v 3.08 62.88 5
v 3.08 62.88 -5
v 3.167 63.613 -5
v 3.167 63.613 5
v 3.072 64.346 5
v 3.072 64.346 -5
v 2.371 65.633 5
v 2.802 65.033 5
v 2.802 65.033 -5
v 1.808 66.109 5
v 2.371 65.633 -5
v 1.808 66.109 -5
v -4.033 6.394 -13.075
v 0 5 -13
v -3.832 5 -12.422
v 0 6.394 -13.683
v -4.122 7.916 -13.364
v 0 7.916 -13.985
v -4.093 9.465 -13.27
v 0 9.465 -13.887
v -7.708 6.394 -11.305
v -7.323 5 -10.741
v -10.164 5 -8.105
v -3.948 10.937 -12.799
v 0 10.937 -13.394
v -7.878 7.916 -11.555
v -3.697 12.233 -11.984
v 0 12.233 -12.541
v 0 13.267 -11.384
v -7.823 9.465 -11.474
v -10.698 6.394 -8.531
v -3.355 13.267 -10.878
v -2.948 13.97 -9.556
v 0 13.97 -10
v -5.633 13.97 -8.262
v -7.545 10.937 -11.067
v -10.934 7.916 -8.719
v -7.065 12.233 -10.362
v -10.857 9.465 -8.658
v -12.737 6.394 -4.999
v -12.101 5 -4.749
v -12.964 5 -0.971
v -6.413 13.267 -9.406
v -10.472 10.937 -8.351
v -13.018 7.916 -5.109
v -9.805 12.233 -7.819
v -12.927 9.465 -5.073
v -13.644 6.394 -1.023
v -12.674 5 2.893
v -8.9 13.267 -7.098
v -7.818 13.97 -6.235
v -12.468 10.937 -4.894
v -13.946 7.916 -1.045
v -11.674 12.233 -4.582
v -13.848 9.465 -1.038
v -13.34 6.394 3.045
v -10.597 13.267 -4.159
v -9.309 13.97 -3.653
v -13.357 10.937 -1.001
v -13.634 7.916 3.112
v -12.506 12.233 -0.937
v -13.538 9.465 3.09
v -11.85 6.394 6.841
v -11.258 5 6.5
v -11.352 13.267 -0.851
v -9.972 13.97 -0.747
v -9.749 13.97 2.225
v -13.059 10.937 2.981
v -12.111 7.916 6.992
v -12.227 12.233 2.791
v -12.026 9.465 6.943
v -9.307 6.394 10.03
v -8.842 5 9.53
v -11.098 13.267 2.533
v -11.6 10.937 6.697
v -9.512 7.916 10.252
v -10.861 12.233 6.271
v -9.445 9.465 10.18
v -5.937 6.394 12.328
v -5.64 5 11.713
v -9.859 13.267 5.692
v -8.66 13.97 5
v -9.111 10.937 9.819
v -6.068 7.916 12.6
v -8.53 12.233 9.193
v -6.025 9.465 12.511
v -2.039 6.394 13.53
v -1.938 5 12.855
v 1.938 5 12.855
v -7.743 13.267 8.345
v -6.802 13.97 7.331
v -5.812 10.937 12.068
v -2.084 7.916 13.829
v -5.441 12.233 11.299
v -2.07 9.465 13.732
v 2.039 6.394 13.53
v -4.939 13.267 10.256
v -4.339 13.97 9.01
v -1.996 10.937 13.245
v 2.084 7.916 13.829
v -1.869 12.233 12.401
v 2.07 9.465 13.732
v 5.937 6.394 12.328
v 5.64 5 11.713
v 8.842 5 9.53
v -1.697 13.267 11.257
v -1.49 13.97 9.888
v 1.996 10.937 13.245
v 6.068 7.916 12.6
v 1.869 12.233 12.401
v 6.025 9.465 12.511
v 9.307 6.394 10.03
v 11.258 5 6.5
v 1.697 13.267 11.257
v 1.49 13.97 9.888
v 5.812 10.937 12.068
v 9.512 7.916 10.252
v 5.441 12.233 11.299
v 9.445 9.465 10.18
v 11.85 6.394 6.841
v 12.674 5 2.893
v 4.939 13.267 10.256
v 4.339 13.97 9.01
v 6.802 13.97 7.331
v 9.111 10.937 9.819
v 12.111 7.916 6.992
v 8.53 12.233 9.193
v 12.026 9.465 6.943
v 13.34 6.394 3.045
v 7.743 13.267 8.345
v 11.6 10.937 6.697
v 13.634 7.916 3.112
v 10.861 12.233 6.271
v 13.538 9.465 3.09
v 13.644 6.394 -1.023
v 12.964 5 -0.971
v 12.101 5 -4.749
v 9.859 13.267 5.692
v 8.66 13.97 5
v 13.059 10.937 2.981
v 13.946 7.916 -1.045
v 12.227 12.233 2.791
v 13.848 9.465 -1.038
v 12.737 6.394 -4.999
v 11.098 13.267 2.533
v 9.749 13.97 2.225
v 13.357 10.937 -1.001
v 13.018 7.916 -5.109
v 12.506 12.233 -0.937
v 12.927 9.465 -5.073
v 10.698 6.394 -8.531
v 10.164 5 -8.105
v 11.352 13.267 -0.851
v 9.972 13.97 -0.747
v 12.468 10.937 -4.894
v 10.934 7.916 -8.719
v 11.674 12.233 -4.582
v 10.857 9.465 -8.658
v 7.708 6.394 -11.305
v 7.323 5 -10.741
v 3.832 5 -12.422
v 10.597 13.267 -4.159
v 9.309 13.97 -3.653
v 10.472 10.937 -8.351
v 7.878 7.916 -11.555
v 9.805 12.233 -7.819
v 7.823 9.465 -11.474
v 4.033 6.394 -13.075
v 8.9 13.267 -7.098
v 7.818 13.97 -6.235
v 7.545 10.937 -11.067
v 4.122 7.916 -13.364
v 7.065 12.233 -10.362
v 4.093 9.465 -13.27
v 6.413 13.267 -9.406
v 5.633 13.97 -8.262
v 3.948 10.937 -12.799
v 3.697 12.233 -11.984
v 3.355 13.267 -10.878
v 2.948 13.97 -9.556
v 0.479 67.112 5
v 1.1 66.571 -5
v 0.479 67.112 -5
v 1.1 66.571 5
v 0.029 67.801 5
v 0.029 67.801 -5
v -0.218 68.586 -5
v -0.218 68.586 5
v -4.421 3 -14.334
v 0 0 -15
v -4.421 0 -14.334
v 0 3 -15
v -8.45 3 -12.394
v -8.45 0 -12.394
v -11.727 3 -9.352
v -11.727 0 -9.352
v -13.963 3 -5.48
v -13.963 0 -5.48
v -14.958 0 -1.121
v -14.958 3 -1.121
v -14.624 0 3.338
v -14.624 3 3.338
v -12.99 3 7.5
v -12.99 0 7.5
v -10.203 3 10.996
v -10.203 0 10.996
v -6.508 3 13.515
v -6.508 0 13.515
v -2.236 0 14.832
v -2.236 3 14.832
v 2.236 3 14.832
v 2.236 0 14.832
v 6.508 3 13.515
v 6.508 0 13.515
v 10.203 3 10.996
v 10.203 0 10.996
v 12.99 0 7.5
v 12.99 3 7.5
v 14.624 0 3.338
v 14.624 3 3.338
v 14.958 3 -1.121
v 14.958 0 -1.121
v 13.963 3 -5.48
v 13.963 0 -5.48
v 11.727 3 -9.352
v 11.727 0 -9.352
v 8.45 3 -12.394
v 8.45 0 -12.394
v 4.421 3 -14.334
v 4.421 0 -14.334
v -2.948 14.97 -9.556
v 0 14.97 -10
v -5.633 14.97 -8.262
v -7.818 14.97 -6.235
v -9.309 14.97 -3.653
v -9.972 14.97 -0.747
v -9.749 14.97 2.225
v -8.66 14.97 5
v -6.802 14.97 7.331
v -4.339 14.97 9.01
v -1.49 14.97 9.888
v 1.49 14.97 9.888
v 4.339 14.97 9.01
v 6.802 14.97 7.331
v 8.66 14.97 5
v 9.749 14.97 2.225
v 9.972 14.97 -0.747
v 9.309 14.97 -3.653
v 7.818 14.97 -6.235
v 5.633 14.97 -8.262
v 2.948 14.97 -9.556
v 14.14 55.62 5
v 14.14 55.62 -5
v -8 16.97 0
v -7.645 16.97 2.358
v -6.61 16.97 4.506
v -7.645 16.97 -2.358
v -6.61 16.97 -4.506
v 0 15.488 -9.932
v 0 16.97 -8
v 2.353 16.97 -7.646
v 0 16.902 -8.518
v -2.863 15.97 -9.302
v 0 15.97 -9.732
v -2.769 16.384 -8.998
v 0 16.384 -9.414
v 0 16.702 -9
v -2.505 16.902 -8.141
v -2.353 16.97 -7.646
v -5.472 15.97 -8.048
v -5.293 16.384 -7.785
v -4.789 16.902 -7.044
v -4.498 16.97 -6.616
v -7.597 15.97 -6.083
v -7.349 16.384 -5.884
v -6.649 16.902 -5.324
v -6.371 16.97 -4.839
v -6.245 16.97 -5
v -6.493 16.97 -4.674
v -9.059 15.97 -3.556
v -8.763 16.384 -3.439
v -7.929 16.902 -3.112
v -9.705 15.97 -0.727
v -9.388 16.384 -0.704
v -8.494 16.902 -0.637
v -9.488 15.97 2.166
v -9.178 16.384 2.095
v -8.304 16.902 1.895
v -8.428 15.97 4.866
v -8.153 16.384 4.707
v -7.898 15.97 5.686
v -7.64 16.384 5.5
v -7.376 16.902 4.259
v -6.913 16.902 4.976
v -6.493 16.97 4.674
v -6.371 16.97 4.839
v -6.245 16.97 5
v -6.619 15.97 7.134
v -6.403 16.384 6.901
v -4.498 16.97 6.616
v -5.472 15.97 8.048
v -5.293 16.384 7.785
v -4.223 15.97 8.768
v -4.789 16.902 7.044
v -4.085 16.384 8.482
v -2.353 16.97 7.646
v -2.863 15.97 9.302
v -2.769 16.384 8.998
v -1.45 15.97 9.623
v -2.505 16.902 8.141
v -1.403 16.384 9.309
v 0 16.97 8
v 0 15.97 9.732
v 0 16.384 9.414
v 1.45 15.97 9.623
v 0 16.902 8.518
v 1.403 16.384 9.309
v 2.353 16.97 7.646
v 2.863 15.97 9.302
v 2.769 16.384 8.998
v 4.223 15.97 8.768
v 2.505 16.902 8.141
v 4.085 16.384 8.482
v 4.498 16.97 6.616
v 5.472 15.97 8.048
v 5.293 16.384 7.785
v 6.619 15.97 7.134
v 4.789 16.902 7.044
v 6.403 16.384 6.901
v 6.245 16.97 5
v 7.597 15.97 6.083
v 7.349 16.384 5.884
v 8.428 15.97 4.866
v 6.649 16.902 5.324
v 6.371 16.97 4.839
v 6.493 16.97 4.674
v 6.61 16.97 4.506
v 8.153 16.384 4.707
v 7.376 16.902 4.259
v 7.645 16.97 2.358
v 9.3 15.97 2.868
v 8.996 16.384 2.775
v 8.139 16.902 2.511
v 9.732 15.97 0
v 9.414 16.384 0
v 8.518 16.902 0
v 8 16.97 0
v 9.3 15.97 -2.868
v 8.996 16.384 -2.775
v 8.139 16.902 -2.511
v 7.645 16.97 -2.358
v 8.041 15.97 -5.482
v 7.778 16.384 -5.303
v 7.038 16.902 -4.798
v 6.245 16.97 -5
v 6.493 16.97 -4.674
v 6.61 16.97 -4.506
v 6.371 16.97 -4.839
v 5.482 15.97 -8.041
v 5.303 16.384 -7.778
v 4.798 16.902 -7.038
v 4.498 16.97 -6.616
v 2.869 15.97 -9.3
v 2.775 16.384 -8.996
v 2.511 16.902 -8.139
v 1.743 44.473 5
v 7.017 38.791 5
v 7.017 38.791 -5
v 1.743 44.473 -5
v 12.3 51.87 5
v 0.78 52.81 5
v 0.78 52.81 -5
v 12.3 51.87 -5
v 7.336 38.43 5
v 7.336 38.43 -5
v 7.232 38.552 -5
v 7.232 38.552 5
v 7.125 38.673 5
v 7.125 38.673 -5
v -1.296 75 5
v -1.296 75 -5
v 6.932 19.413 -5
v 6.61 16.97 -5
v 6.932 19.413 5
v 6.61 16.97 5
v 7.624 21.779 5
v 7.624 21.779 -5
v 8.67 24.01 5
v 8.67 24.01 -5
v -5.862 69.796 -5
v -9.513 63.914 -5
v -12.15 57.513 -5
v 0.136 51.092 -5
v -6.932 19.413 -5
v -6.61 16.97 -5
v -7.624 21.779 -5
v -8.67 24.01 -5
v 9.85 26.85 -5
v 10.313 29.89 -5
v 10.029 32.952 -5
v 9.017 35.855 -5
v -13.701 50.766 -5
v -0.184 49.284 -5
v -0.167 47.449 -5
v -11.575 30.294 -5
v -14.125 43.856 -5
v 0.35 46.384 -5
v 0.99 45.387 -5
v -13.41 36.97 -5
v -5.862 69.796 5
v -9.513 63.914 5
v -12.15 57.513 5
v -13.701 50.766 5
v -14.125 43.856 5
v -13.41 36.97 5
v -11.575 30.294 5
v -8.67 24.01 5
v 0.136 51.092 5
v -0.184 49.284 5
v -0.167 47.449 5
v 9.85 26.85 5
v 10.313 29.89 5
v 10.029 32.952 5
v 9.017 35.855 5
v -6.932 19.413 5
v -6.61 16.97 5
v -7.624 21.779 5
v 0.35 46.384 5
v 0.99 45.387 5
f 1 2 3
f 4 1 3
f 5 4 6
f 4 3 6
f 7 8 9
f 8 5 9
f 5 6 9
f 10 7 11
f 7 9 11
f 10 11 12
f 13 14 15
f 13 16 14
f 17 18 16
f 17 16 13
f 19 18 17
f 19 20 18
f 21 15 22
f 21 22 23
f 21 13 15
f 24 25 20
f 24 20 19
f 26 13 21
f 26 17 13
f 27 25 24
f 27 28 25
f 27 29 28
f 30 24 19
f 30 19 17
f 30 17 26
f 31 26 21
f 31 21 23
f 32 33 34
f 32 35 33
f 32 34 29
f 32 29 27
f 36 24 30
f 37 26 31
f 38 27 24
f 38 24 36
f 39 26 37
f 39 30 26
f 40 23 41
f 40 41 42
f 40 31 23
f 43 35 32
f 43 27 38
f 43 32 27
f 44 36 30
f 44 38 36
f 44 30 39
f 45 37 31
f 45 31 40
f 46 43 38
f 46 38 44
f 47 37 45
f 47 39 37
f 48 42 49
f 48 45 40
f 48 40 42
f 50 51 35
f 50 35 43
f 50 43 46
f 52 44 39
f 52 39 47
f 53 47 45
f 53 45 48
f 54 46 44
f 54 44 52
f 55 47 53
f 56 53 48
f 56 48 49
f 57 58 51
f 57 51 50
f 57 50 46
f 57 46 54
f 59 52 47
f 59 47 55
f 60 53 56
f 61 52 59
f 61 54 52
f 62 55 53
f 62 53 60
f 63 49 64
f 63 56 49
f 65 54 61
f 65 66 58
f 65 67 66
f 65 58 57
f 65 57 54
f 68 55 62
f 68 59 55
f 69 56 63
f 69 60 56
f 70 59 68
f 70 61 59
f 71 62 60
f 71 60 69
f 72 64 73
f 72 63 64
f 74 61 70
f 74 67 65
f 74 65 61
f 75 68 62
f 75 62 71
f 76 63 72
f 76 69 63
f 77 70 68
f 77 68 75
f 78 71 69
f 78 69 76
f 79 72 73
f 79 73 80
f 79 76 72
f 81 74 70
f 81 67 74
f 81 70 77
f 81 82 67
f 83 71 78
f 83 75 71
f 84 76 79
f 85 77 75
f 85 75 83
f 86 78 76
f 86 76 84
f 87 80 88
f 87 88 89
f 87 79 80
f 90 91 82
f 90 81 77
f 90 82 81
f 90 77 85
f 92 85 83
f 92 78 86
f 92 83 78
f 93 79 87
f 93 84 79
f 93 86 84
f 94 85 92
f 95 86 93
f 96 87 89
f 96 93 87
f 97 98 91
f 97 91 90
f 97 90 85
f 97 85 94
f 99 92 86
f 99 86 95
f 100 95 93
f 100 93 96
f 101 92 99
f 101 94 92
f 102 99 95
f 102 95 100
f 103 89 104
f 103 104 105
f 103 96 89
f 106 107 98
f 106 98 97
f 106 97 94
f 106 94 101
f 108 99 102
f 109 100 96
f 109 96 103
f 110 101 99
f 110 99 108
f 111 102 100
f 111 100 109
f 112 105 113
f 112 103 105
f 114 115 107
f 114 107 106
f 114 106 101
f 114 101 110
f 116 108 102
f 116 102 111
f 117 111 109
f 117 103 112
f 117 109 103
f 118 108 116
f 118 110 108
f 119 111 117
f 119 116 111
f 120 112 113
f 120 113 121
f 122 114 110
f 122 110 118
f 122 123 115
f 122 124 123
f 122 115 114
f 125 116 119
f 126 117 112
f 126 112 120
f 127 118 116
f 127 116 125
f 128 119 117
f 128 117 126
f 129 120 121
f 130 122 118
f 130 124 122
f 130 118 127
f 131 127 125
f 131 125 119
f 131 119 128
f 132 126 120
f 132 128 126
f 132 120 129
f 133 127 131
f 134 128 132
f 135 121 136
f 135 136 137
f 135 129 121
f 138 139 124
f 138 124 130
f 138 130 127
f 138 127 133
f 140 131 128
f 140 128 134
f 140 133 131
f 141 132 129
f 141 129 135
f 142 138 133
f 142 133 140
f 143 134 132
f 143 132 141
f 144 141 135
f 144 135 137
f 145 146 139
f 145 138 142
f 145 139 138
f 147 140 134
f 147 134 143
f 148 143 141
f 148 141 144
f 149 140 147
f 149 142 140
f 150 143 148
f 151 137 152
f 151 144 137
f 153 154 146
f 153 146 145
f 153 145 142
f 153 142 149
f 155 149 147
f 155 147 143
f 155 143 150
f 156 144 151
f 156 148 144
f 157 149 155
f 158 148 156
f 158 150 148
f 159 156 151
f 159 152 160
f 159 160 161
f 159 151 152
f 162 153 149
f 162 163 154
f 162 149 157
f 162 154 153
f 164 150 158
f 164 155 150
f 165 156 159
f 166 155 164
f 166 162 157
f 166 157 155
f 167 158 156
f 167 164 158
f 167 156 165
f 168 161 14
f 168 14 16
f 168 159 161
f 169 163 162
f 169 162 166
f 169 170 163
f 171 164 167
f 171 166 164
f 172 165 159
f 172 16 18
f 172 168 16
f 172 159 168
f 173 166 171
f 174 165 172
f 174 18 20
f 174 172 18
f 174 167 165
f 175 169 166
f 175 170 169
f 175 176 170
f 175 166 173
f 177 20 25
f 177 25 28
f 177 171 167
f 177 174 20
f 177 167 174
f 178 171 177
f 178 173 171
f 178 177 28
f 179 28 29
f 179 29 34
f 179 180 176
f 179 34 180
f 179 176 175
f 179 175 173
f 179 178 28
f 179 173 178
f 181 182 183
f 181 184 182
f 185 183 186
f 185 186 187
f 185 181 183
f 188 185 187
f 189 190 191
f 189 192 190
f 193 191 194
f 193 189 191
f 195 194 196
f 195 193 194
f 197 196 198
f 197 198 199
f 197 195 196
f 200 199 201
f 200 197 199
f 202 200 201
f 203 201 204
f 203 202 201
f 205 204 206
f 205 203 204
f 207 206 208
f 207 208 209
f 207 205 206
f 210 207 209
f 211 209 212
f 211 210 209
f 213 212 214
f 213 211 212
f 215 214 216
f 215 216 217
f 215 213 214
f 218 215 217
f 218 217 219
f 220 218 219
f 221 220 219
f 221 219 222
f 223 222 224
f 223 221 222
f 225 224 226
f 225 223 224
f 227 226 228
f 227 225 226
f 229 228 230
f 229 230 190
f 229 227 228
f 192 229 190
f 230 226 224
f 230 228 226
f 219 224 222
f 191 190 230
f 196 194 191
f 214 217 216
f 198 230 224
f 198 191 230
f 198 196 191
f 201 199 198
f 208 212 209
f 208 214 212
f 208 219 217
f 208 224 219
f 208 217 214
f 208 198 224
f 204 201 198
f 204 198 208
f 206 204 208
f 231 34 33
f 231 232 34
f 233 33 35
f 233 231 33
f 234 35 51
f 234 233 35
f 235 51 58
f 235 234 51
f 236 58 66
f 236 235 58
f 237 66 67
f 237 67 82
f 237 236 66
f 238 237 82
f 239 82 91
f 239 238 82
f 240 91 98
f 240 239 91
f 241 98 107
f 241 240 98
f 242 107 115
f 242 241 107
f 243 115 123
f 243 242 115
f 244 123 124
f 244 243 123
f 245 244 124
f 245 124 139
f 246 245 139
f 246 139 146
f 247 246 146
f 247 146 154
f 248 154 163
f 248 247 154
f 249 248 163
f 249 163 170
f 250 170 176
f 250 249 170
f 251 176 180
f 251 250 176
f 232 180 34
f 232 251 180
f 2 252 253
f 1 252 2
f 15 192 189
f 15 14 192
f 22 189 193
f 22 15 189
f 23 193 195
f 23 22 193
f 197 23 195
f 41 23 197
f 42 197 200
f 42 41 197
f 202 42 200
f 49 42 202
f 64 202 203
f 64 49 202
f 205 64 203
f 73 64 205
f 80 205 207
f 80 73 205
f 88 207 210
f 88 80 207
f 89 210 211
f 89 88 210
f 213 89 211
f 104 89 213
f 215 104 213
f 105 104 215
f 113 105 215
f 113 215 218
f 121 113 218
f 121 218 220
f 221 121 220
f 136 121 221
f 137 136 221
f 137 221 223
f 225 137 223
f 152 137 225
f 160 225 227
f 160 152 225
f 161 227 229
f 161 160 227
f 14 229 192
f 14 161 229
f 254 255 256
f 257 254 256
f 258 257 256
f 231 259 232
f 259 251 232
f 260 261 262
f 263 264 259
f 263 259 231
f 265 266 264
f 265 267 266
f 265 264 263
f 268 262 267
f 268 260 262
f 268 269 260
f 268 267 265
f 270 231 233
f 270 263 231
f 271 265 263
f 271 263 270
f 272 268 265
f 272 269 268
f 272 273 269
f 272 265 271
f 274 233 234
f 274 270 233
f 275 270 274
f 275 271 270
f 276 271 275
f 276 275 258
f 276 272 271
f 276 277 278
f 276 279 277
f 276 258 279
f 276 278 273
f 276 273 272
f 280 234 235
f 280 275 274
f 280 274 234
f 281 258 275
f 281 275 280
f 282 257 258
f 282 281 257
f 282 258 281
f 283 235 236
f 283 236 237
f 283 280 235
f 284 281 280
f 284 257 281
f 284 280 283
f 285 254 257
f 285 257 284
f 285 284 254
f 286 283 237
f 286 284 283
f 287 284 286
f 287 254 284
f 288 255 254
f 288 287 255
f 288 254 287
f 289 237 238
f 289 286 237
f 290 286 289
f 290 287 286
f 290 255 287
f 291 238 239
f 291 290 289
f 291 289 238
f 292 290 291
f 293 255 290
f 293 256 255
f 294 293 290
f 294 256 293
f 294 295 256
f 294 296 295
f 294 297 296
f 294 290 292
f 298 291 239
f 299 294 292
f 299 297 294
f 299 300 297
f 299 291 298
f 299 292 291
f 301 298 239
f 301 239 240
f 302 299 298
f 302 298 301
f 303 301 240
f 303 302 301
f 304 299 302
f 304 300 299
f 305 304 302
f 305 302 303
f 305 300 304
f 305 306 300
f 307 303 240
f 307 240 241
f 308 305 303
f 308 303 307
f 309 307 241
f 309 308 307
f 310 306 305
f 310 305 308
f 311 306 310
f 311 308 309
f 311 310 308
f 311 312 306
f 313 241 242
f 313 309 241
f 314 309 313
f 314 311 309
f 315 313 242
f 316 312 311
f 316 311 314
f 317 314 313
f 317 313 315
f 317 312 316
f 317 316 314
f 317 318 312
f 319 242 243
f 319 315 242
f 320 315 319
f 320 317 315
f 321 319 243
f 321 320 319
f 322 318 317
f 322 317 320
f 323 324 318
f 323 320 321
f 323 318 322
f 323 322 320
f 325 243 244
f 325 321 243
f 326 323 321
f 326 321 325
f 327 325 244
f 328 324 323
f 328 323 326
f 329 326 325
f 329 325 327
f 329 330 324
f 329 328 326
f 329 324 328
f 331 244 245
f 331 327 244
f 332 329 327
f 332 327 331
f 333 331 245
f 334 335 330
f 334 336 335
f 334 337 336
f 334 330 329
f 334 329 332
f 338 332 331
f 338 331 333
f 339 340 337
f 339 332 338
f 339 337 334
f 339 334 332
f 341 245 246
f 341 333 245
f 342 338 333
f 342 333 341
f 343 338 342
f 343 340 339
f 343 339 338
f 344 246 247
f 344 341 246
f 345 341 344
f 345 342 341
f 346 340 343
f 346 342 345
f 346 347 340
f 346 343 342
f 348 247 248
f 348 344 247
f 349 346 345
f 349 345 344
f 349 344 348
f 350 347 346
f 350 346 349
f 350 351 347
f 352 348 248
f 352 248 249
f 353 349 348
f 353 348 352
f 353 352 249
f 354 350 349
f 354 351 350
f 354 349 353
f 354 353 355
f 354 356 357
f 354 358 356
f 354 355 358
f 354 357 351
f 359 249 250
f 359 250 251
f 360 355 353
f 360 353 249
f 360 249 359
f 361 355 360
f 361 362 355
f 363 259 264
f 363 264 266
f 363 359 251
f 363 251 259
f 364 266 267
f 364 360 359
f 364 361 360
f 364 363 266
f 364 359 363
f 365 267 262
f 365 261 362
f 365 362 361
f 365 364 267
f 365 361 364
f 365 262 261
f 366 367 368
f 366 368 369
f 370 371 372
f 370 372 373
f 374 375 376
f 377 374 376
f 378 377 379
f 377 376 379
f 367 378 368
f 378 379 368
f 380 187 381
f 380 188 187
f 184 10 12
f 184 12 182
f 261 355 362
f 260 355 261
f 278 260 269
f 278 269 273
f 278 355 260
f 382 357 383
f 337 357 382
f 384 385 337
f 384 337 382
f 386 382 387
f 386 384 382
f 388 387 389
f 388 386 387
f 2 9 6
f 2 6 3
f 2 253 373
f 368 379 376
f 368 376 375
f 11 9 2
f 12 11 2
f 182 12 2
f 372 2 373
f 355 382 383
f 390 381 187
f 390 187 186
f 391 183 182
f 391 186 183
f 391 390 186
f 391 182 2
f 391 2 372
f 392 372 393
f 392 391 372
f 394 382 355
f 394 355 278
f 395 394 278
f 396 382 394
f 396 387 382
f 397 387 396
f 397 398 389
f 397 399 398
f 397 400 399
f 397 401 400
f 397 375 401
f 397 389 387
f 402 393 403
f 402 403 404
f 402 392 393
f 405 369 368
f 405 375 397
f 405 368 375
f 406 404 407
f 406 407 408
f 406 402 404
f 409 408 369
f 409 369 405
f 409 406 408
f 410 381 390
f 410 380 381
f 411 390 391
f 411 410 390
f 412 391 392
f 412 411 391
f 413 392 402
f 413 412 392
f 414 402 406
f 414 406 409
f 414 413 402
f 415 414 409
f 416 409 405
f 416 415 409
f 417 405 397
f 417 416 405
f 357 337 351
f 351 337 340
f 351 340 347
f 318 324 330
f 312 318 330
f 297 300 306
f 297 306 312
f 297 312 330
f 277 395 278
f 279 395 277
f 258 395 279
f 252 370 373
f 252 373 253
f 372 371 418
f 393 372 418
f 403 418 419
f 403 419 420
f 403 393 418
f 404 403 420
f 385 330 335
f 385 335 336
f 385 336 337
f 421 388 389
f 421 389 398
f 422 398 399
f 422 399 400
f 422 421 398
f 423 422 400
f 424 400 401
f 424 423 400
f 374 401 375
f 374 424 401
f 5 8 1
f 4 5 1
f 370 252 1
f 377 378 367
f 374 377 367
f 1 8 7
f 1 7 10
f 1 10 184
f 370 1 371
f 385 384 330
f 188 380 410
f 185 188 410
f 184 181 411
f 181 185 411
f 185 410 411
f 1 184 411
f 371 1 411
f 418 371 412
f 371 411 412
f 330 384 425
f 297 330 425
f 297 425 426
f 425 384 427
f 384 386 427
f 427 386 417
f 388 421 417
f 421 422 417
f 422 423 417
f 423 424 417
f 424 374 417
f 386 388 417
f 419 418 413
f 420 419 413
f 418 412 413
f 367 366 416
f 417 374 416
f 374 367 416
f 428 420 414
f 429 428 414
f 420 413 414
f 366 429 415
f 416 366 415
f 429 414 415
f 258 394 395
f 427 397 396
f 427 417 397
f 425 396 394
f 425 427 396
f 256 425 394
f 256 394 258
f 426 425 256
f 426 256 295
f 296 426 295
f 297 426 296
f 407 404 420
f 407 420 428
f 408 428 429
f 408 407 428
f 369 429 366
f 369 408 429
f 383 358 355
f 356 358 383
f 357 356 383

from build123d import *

# Parameters (mm, degrees)
BOSS_EXTRUDE1_DEPTH = 5
FILLET1_R           = 3
FILLET2_R           = 10
FILLET3_R           = 3


with BuildPart() as part:
    # Sketch1 → Revolve1 (revolve)
    with BuildSketch(Plane.XY, mode=Mode.PRIVATE) as revolve1_sk:
        with BuildLine():
            Line((0, 0), (-15, 0))
            Line((-15, 0), (-15, 3))
            Line((-15, 3), (-13, 5))
            ThreePointArc((-13, 5), (-13.688325627, 10.216881481), (-10, 13.97))
            Line((-10, 13.97), (-10, 14.97))
            ThreePointArc((-10, 14.97), (-9.414213562, 16.384213562), (-8, 16.97))
            Line((-8, 16.97), (0, 16.97))
            Line((0, 16.97), (0, 0))
        make_face()
    revolve(revolve1_sk.sketch.rotate(Axis((0, 0, 0), (0, 1, 0)), 270), axis=Axis((0, 0, 0), (0, 1, 0)))

    # Sketch2 → Boss-Extrude1 (add, symmetric)
    with BuildSketch(Plane.XY):
        with BuildLine():
            Line((-6.61, 16.97), (6.61, 16.97))
            ThreePointArc((6.61, 16.97), (7.232167752, 20.609337277), (8.67, 24.01))
            ThreePointArc((8.67, 24.01), (10.247857058, 31.593597712), (7.12, 38.68))
            Line((7.12, 38.68), (0, 46.35))
            Line((0, 46.35), (-1, 50.32))
            Line((-1, 50.32), (0.78, 52.81))
            Line((0.78, 52.81), (12.3, 51.87))
            Line((12.3, 51.87), (14.14, 55.62))
            Line((14.14, 55.62), (3.08, 62.88))
            Line((3.08, 62.88), (4.18, 64.56))
            Line((4.18, 64.56), (0, 67.29))
            Line((0, 67.29), (-1.295560409, 75))
            ThreePointArc((-1.295560409, 75), (-13.70107173, 50.765884766), (-8.67, 24.01))
            ThreePointArc((-8.67, 24.01), (-7.232167752, 20.609337277), (-6.61, 16.97))
        make_face()
    extrude(amount=BOSS_EXTRUDE1_DEPTH, both=True)

    # Fillet1
    fillet1_edges = [part.edges().sort_by_distance(p)[0] for p in [
        (0, 67.29, 0),
    ]]
    fillet(fillet1_edges, radius=FILLET1_R)

    # Fillet2
    # the kernel refuses this fillet: 10 mm, written as the material it adds along each edge
    with BuildSketch(Plane(origin=(-1, 50.32, -5), x_dir=(0.5815472036077696, 0.8135126612265992, 0), z_dir=(0, 0, 1))) as fillet2_piece_1:
        with BuildLine():
            CenterArc((4.753344766, -9.855723924), FILLET2_R, 99.744472398, 39.953038391)
            Line((-2.873057527, -3.387494795), (0, 0))
            Line((0, 0), (3.060800549, 0))
        make_face()
    extrude(amount=10)
    with BuildSketch(Plane(origin=(0, 46.35, -5), x_dir=(-0.24425942618290672, 0.9697099219461441, 0), z_dir=(0, 0, 1))) as fillet2_piece_2:
        with BuildLine():
            CenterArc((FILLET2_R * 0.256126103546, -FILLET2_R), FILLET2_R, 90, 28.732234305)
            Line((-FILLET2_R * 0.224590795698, -FILLET2_R * 0.123124146312), (0, 0))
            Line((0, 0), (FILLET2_R * 0.256126103546, 0))
        make_face()
    extrude(amount=10)
    # the kernel refuses this fillet: 10 mm, written as the material it takes off along each edge
    with BuildSketch(Plane(origin=(7.12, 38.68, -5.825464024), x_dir=(-0.6803411396995018, 0.7328955816706653, 0), z_dir=(0, 0, 1))) as fillet2_2_piece_1:
        with BuildLine():
            CenterArc((0.151797952, 10), FILLET2_R, 267.238538955, 2.761461045)
            ThreePointArc((-0.32998135, 0.011612307), (-0.165028474, 0.004732024), (0, 0))
            Line((0, 0), (0.151797952, 0))
        make_face()
    extrude(amount=11.650928049, mode=Mode.SUBTRACT)

    # Fillet3
    # the kernel refuses this fillet: 3 mm, written as the material it takes off along each edge
    with BuildSketch(Plane(origin=(4.18, 64.56, -12.08398788), x_dir=(-0.5477859413637723, -0.8366185286283144, 0), z_dir=(0, 0, 1))) as fillet3_piece_1:
        with BuildLine():
            CenterArc((3.003276632, -2.830122074), FILLET3_R, 109.373873229, 70.692421457)
            Line((0.00327864, -2.833593255), (-0.056721319, -2.833662679))
            Line((-0.056721319, -2.833662679), (-0.05999996, -6.9424e-05))
            Line((-0.05999996, -6.9424e-05), (0, 0.06))
            ThreePointArc((0, 0.06), (1.004041832, 0.06), (1.988179804, 0.056602441))
            Line((1.988179804, 0.056602441), (2.008083664, 0))
        make_face()
    extrude(amount=24.16797576, mode=Mode.SUBTRACT)


solid = part.part
